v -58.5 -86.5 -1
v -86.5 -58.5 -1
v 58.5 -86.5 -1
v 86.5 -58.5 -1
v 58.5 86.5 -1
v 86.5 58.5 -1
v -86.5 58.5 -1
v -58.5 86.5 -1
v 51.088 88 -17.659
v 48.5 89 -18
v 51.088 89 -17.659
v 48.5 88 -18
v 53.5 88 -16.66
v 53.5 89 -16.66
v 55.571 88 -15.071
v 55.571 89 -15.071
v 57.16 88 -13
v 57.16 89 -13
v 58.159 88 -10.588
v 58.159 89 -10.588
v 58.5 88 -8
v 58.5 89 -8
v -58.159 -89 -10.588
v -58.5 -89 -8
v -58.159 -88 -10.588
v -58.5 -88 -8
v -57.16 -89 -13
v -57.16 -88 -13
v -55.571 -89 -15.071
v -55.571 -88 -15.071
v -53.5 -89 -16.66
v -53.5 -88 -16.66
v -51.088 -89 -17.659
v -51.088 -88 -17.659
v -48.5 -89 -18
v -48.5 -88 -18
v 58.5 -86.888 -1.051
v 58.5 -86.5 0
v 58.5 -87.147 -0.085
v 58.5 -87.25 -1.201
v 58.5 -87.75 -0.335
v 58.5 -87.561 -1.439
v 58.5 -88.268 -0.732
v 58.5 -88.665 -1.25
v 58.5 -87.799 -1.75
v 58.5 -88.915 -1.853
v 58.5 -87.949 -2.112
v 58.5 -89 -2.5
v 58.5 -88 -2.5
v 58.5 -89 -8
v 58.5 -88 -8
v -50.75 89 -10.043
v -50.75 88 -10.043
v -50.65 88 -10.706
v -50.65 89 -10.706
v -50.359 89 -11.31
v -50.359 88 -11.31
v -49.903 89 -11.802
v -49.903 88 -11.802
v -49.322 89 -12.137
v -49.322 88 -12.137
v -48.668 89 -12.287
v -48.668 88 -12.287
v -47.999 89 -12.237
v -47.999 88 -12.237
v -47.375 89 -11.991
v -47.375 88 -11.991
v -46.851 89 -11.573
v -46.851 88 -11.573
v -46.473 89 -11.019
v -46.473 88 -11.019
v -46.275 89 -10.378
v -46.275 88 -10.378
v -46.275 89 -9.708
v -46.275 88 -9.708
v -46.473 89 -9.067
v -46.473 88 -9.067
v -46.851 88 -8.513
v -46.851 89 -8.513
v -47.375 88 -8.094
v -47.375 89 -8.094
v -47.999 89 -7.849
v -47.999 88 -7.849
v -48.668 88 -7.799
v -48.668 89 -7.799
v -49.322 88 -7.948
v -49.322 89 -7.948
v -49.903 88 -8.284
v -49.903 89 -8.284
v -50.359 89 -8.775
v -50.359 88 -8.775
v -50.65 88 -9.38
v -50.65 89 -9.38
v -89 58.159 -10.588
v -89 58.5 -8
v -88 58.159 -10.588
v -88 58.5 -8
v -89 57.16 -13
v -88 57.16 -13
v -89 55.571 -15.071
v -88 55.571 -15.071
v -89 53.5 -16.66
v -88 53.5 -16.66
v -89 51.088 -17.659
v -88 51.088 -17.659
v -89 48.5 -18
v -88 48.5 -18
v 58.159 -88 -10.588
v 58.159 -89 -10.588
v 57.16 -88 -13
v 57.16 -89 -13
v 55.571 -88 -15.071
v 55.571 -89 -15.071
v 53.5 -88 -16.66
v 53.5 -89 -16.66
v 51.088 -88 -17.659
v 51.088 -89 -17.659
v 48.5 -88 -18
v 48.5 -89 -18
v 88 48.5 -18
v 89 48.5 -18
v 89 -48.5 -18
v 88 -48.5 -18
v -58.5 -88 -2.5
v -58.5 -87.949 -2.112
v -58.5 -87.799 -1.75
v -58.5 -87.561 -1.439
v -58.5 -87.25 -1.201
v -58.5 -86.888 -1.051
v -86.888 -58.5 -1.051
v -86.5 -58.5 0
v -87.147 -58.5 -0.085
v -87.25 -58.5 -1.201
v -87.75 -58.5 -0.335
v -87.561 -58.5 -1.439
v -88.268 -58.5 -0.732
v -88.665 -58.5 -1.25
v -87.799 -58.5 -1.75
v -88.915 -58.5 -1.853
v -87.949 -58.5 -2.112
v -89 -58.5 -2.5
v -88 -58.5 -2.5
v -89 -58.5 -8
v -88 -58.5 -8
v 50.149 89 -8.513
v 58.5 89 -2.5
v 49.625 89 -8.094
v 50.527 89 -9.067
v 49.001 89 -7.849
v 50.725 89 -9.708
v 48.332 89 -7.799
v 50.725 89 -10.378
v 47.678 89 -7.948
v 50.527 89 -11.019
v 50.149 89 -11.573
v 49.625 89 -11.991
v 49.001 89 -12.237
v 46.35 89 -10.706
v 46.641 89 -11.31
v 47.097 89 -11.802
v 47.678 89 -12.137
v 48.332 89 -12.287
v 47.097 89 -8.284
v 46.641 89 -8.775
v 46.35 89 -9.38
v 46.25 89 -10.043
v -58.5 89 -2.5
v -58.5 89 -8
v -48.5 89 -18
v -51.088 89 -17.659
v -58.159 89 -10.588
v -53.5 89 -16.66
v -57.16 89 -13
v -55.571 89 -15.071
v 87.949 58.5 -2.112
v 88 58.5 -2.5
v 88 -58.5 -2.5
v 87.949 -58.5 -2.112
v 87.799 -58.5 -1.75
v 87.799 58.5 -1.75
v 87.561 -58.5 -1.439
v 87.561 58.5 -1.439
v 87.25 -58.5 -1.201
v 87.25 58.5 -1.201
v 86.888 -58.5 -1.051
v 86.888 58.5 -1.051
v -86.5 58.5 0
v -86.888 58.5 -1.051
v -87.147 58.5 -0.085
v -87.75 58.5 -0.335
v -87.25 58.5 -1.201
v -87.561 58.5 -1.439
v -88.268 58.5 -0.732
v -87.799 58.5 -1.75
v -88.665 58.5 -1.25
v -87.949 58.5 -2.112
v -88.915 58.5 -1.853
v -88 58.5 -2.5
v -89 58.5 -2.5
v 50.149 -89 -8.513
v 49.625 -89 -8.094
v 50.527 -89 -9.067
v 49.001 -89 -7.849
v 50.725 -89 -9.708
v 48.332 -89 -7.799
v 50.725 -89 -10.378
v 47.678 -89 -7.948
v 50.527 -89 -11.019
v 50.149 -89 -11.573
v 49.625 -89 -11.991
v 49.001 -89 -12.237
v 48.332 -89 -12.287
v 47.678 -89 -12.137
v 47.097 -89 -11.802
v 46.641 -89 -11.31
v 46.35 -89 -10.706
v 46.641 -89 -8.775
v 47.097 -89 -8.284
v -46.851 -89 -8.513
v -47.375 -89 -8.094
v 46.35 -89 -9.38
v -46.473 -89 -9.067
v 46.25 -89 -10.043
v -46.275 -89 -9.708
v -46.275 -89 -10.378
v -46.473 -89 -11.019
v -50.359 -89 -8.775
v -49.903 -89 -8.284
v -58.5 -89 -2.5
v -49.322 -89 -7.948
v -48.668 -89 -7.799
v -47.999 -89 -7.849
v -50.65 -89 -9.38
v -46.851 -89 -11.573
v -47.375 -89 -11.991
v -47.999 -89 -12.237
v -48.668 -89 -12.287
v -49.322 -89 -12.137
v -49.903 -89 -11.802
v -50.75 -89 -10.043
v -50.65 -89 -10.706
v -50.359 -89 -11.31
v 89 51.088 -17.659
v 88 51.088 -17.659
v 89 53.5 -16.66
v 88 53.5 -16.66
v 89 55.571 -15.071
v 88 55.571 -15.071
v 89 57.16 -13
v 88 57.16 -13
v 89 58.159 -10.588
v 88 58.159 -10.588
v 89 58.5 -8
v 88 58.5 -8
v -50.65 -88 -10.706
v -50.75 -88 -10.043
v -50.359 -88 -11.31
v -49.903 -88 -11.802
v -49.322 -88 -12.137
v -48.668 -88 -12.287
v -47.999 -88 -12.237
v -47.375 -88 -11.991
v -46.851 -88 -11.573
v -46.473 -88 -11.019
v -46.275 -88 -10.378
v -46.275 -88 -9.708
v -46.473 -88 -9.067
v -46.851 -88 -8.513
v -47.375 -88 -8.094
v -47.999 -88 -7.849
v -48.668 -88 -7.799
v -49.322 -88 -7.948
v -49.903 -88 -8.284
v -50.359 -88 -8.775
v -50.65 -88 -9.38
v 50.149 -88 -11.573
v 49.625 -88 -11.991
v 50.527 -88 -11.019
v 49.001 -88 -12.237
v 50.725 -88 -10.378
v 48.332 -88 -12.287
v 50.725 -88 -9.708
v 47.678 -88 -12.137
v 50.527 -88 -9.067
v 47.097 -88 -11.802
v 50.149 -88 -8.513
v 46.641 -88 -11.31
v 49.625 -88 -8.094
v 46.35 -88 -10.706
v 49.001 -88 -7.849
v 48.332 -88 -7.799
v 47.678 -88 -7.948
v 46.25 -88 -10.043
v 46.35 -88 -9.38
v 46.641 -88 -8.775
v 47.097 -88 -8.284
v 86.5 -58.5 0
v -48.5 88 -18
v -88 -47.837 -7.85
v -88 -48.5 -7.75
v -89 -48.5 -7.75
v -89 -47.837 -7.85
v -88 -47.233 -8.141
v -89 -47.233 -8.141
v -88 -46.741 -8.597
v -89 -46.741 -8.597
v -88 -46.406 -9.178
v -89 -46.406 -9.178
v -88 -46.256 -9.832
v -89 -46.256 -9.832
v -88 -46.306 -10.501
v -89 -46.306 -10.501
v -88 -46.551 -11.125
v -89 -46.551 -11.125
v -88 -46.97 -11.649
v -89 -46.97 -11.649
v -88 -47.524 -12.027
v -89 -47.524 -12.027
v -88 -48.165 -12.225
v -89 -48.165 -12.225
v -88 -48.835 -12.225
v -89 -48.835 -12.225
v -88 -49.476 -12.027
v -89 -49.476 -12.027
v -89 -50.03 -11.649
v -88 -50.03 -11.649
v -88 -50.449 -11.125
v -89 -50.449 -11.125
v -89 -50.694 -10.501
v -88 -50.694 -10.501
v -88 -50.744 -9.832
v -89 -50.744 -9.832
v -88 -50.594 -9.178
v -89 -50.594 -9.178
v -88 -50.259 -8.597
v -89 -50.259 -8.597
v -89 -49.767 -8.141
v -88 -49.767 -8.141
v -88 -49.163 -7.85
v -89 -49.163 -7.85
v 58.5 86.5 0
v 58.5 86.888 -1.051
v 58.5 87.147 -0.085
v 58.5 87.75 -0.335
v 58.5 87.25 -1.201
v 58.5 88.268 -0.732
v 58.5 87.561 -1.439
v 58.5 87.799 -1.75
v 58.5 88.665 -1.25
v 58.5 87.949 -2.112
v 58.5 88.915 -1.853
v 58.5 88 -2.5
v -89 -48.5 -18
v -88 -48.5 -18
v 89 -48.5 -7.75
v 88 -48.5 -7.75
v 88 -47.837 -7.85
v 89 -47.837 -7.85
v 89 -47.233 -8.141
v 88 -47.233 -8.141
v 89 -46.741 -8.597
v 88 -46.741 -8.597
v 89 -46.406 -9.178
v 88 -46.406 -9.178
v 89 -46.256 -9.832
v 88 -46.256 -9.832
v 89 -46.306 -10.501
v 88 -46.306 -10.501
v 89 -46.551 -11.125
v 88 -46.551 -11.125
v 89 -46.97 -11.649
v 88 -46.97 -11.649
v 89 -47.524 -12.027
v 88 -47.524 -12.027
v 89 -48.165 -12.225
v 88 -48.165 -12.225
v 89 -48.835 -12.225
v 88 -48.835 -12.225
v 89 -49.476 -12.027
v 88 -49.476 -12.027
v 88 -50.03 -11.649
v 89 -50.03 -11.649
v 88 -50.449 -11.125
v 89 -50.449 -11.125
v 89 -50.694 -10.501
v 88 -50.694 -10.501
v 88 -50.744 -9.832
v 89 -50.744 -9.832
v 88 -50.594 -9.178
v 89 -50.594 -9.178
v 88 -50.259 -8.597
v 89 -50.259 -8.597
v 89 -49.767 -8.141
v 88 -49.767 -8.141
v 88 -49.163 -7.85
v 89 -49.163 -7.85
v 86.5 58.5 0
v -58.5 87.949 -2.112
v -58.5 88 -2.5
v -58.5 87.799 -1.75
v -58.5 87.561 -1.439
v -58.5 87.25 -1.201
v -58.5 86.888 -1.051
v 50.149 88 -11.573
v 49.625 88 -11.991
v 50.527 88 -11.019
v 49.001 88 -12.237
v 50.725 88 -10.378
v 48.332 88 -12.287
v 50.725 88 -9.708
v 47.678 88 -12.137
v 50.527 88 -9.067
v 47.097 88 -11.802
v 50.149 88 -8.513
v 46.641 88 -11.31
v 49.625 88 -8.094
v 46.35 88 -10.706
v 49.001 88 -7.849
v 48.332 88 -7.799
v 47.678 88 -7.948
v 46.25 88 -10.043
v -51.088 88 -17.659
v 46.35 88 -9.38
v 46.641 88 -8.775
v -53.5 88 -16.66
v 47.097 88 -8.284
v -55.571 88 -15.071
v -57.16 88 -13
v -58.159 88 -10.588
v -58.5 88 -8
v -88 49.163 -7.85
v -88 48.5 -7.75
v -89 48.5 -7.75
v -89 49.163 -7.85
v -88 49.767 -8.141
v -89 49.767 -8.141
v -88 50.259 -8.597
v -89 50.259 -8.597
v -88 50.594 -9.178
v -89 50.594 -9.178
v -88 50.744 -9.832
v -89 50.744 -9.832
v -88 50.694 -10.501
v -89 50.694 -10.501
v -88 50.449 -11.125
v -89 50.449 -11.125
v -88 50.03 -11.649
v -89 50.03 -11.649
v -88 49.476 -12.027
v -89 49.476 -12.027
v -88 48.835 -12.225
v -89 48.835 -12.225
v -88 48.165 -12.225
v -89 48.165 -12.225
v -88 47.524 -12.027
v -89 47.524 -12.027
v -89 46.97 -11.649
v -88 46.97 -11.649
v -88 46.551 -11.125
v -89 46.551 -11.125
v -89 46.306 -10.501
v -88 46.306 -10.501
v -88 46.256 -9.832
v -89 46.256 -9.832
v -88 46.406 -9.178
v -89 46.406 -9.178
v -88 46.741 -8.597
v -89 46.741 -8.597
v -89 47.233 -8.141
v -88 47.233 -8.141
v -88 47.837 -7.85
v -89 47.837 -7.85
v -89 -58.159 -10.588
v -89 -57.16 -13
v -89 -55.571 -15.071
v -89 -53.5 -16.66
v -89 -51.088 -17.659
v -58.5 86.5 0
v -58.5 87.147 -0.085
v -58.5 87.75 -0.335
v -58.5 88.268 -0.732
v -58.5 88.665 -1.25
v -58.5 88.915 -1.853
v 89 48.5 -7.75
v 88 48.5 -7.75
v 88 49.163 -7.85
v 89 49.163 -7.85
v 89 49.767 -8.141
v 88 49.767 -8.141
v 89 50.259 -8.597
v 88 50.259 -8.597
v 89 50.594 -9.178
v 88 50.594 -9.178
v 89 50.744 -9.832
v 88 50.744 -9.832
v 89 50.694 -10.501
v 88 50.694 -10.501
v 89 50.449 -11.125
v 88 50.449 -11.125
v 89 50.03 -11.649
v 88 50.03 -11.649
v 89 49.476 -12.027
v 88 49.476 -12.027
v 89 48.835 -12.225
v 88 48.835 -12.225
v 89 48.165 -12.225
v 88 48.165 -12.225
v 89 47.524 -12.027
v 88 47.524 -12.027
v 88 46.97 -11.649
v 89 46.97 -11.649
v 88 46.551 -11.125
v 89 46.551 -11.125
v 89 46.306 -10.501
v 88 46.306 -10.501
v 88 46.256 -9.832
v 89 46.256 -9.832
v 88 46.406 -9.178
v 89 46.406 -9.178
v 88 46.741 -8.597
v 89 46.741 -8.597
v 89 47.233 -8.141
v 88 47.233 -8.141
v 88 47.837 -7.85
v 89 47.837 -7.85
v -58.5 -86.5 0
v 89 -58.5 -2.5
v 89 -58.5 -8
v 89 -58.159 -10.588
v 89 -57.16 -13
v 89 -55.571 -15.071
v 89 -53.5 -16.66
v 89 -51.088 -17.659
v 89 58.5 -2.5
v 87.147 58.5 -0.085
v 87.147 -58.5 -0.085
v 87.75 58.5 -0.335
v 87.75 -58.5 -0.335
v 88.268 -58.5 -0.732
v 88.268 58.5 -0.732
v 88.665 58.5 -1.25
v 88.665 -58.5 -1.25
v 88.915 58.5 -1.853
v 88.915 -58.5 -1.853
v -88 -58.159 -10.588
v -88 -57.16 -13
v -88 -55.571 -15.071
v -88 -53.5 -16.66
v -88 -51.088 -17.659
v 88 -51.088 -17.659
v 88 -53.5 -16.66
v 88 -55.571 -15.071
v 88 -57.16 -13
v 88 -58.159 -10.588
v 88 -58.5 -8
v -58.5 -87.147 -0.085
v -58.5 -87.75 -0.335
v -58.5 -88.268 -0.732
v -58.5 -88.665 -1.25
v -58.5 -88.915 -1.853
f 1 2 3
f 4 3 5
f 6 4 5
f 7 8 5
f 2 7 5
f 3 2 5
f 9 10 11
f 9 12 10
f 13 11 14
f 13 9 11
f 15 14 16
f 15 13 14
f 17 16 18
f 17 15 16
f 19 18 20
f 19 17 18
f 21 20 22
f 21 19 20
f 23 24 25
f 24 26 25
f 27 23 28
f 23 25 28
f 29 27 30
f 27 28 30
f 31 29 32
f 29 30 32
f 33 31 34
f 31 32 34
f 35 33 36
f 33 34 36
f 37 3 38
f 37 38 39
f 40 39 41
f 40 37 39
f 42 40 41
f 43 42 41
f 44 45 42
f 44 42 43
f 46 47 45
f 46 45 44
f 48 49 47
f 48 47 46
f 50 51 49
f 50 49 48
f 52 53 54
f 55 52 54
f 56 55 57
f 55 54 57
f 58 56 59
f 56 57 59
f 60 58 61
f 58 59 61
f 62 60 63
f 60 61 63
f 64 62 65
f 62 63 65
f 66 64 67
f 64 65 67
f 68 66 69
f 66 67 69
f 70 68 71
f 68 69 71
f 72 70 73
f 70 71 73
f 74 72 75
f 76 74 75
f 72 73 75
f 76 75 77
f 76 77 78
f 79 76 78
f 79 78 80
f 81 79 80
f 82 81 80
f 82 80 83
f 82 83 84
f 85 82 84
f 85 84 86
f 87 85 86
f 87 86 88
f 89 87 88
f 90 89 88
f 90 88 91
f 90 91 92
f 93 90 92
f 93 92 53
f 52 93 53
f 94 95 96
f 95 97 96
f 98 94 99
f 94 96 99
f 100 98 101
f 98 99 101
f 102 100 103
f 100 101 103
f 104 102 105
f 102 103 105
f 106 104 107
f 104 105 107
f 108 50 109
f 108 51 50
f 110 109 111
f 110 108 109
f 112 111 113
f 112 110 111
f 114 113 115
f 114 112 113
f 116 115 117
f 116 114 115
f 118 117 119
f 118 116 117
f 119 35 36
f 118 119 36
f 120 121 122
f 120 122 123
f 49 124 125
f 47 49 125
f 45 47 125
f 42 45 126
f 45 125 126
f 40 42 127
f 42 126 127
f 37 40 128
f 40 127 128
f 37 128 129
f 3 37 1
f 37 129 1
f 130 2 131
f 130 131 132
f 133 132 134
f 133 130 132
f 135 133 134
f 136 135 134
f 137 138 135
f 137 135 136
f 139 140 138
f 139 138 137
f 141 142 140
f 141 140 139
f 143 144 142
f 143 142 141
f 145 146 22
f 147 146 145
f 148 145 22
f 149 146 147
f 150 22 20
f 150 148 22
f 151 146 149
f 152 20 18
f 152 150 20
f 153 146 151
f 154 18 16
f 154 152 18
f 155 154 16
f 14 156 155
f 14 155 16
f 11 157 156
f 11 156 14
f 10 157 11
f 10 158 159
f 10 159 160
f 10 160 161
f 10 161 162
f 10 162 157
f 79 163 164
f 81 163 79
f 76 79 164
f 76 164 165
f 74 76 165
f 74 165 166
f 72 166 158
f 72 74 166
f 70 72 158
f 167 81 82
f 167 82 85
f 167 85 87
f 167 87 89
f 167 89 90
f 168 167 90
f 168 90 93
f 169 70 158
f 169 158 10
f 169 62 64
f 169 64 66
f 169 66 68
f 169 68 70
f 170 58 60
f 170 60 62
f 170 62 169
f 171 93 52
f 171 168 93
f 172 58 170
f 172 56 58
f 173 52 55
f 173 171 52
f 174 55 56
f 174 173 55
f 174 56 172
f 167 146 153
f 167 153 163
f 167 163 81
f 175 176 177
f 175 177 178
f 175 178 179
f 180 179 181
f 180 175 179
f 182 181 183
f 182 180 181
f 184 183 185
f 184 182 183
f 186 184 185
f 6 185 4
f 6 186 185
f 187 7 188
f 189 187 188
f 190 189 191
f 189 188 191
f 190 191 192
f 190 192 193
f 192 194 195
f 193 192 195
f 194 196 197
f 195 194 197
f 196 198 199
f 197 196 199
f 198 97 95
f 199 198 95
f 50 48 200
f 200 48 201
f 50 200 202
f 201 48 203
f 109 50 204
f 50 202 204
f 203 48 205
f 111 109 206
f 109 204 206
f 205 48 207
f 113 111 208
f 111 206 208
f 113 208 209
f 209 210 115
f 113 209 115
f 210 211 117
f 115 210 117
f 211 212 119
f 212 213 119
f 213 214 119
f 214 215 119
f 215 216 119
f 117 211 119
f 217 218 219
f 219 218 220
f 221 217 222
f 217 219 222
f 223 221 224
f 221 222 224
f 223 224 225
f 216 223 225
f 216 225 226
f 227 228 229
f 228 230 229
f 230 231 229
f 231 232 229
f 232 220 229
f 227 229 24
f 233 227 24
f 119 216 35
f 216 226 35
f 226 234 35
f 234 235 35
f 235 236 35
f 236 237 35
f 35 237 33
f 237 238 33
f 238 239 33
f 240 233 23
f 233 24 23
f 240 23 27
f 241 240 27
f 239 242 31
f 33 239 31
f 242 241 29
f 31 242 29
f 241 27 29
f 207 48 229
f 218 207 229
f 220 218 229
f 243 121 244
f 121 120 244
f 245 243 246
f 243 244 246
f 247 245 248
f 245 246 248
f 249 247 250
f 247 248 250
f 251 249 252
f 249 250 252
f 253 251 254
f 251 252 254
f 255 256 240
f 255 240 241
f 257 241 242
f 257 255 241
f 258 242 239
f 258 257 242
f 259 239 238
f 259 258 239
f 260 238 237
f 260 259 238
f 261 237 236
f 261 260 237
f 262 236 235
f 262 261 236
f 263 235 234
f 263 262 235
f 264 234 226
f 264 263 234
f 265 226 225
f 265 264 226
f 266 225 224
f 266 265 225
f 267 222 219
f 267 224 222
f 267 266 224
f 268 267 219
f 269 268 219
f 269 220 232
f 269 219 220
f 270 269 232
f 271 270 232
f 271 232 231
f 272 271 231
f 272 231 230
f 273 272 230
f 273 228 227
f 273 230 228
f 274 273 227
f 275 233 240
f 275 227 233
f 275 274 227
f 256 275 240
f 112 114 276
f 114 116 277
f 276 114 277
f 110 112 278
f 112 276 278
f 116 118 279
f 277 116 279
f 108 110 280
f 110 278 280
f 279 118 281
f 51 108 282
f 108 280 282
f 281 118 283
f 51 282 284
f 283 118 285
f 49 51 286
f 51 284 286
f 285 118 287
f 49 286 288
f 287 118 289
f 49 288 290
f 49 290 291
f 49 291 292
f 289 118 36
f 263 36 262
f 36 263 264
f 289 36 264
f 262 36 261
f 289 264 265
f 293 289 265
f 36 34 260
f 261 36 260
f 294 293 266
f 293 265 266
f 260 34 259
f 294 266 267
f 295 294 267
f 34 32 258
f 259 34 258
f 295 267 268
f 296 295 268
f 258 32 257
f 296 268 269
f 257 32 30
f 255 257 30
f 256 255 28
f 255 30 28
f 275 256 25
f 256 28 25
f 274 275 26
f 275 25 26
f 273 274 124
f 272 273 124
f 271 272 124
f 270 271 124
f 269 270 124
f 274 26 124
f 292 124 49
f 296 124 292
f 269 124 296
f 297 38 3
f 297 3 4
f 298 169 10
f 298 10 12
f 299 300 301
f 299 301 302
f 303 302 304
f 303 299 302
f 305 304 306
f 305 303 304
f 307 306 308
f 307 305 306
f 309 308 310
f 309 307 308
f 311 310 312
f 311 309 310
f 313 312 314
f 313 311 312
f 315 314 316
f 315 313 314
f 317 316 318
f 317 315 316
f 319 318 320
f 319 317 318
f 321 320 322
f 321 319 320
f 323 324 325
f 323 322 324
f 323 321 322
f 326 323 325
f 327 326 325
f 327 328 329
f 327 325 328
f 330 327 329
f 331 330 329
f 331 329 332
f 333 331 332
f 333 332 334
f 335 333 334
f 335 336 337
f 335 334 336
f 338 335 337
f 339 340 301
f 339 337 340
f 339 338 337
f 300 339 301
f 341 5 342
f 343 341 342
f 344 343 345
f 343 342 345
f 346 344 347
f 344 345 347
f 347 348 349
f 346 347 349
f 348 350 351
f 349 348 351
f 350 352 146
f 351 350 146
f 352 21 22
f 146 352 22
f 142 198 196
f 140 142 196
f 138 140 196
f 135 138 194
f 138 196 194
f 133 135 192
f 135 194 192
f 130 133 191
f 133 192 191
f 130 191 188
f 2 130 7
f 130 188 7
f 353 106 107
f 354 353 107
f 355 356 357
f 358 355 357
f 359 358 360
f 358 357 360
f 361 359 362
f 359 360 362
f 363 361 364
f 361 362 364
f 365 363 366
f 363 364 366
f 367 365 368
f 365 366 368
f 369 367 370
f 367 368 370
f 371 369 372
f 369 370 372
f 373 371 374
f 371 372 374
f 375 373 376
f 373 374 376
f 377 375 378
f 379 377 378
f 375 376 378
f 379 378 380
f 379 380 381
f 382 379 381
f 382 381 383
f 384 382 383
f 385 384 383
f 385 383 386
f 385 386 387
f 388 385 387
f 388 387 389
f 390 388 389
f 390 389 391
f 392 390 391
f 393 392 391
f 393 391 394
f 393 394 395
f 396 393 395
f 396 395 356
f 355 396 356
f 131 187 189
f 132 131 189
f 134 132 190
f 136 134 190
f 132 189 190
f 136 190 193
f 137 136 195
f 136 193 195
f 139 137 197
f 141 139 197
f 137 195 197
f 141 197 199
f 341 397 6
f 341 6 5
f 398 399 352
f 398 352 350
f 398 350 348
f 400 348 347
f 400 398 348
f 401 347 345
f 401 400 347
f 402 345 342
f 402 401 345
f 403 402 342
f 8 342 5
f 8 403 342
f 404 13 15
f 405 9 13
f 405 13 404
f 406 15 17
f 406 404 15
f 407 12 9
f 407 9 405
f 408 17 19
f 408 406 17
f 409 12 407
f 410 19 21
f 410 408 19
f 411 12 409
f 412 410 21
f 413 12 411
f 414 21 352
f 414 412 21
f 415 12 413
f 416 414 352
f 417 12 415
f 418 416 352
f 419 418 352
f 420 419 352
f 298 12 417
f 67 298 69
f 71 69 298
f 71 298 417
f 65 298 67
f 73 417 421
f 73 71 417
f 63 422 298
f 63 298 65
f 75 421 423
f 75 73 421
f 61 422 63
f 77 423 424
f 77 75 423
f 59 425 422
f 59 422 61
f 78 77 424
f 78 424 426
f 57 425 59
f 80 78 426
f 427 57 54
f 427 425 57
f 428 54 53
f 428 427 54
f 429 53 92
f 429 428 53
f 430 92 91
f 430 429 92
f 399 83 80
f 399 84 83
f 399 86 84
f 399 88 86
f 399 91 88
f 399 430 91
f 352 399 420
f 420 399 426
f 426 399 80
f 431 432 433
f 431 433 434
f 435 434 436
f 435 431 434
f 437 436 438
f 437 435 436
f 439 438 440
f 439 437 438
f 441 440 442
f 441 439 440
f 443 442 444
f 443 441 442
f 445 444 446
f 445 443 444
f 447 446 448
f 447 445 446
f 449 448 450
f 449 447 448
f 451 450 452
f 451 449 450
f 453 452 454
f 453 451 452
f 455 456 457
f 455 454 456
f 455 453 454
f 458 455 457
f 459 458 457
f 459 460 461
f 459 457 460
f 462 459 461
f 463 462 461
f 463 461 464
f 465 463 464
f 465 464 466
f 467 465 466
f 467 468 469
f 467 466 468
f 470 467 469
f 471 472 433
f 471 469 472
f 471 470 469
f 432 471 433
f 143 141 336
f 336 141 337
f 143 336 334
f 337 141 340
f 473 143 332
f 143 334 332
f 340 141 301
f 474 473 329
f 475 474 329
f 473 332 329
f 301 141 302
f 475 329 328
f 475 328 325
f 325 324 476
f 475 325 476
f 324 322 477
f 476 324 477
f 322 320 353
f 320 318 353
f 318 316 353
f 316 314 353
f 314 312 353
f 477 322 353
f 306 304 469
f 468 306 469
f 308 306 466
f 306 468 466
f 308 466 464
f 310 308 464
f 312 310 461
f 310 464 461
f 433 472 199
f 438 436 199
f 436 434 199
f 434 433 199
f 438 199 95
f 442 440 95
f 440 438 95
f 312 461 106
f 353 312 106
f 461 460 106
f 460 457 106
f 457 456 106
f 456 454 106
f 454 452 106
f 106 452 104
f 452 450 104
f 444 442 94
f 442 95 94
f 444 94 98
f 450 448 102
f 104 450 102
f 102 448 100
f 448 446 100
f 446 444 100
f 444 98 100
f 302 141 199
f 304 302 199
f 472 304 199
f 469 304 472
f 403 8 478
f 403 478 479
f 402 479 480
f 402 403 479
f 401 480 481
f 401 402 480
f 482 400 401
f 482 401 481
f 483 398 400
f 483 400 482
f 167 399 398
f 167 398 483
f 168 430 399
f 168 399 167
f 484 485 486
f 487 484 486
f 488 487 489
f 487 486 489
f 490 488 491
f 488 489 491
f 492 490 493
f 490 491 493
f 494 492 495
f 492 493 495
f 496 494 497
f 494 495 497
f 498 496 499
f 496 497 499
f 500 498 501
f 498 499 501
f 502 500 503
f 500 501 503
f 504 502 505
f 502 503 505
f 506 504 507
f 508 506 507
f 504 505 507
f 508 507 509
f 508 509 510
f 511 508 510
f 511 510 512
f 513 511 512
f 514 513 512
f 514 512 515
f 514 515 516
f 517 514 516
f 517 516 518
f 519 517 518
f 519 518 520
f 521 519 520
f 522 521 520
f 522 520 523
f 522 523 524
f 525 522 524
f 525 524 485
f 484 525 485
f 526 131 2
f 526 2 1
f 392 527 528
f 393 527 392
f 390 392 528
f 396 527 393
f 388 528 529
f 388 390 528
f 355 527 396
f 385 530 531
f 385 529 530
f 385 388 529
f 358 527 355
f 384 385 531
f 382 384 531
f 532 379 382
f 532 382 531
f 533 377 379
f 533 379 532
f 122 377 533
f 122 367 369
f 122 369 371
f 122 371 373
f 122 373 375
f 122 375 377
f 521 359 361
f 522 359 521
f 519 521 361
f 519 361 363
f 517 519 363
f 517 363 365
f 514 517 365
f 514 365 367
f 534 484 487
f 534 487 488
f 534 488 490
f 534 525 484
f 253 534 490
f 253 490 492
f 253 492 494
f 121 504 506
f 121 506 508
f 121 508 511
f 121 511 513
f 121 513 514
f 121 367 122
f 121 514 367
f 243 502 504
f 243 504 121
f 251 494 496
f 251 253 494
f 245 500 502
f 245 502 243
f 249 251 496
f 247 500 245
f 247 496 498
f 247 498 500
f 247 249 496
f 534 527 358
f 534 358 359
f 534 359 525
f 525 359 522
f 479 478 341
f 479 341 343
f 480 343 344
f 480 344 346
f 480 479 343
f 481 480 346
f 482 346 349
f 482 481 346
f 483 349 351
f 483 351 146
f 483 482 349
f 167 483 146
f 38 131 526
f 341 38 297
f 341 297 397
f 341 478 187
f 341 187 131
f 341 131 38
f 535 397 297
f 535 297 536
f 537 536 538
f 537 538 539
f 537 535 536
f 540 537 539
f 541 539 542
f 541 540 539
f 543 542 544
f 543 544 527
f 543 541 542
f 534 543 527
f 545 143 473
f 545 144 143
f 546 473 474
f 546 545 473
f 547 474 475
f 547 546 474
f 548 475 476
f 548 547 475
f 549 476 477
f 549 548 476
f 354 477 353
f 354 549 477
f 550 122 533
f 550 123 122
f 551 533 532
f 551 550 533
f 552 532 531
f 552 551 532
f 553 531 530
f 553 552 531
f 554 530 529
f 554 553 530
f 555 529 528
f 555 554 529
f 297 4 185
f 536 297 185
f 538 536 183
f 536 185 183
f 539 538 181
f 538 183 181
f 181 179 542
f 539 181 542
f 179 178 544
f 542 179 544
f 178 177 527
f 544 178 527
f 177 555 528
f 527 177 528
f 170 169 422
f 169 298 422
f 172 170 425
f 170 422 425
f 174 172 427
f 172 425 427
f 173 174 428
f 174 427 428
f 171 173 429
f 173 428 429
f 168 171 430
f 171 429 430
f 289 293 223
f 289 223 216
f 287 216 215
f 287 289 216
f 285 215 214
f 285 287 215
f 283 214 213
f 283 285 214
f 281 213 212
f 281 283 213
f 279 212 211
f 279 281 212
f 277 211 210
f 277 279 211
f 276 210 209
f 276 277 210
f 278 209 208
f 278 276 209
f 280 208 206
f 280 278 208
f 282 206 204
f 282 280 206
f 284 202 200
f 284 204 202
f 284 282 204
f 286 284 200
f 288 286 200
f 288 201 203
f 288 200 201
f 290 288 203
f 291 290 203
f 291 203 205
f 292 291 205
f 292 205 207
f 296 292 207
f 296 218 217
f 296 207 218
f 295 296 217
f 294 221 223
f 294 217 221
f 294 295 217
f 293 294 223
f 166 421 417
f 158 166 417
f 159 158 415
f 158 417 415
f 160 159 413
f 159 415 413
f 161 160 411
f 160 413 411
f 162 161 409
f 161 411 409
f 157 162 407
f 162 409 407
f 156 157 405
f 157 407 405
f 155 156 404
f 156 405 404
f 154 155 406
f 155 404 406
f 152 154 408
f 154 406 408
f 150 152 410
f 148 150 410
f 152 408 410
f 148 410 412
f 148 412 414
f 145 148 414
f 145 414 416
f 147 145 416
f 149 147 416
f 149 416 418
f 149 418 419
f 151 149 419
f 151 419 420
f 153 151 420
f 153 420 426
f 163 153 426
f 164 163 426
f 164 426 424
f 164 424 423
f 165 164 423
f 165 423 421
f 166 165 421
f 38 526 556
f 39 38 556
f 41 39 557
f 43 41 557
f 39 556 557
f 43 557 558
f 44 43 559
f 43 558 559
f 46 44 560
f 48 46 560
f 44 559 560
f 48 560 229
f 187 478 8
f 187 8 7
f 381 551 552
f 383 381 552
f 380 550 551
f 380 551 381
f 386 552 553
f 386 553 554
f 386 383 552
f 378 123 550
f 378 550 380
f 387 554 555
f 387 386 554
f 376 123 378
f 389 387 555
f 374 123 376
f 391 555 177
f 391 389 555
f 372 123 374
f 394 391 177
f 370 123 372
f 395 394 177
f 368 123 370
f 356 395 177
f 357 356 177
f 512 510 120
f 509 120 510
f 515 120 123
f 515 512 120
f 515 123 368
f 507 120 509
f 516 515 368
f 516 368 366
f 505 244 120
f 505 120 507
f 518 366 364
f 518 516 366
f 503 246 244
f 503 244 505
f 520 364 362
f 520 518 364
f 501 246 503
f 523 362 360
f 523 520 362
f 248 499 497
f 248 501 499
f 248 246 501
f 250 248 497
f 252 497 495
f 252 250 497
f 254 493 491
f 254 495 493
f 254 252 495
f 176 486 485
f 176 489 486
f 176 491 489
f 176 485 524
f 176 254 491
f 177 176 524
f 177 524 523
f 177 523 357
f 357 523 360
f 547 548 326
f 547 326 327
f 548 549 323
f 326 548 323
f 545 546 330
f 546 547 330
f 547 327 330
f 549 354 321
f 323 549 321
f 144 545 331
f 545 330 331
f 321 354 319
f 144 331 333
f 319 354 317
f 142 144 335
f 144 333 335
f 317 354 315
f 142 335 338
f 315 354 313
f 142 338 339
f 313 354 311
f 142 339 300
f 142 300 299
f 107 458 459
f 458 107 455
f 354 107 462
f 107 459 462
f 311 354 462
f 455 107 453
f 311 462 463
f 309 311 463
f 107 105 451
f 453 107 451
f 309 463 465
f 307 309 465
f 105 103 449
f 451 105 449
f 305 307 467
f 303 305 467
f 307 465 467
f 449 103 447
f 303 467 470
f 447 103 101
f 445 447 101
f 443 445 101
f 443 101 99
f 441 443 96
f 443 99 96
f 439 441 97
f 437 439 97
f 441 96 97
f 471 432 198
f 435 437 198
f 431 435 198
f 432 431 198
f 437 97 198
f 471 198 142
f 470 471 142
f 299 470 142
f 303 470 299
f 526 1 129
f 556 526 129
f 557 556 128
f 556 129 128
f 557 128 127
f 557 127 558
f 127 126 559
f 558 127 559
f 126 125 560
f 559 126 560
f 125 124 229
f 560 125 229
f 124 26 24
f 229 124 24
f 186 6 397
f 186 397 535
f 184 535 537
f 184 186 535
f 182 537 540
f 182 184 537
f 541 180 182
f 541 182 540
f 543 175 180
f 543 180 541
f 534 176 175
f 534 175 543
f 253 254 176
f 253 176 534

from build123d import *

# Parameters (mm, degrees)
MAIN_PLATE_DEPTH                       = 1
HORI_EDGE_DEPTH                        = 117
HORI_EDGE_FILLETS_R                    = 10
M4_CLEARANCE_HOLE1_D                   = 4.5
M4_CLEARANCE_HOLE1_DEPTH               = 178
VERT_EDGE_DEPTH                        = 117
VERT_EDGE_FILLETS_R                    = 10
M4_CLEARANCE_HOLE2_D                   = 4.5
M4_CLEARANCE_HOLE2_DEPTH               = 178
HORI_EDGE_FILLETS_OF_OTHER_HORI_EDGE_R = 10
VERT_EDGE_FILLETS_OF_OTHER_VERT_EDGE_R = 10


# Sheet-metal steps are written as plain solids
with BuildPart() as part:
    # Sketch1 → Main Plate (new body)
    with BuildSketch(Plane.XY):
        Polygon((-86.5, -58.5), (-58.5, -86.5), (58.5, -86.5), (86.5, -58.5), (86.5, 58.5), (58.5, 86.5), (-58.5, 86.5), (-86.5, 58.5), align=None)
    extrude(amount=-MAIN_PLATE_DEPTH)

    # Hori Edge section (across the edge) → Hori Edge (add)
    with BuildSketch(Plane(origin=(-58.5, 88, -1), x_dir=(0, -1, 0), z_dir=(1, 0, 0))):
        with BuildLine():
            Line((-1, 1.5), (-1, 17))
            Line((-1, 17), (0, 17))
            Line((0, 17), (0, 1.5))
            ThreePointArc((0, 1.5), (0.439339828, 0.439339828), (1.5, 0))
            Line((1.5, 0), (1.5, -1))
            ThreePointArc((1.5, -1), (-0.267766953, -0.267766953), (-1, 1.5))
        make_face()
    hori_edge = extrude(amount=HORI_EDGE_DEPTH)

    # Hori Edge Fillets
    hori_edge_fillets_edges = [part.edges().sort_by_distance(p)[0] for p in [
        (-58.5, 88.5, -18),
        (58.5, 88.5, -18),
    ]]
    fillet(hori_edge_fillets_edges, radius=HORI_EDGE_FILLETS_R)

    # M4 Clearance Hole1
    with Locations(Plane(origin=(0, 89, 0), x_dir=(1, 0, 0), z_dir=(0, 1, 0))):
        with Locations((-48.5, 10.042929808), (48.5, 10.042929808)):
            m4_clearance_hole1 = Hole(M4_CLEARANCE_HOLE1_D / 2, depth=M4_CLEARANCE_HOLE1_DEPTH)

    # Vert Edge section (across the edge) → Vert Edge (add)
    with BuildSketch(Plane(origin=(88, 58.5, -1), x_dir=(-1, 0, 0), z_dir=(0, -1, 0))):
        with BuildLine():
            Line((-1, 1.5), (-1, 17))
            Line((-1, 17), (0, 17))
            Line((0, 17), (0, 1.5))
            ThreePointArc((0, 1.5), (0.439339828, 0.439339828), (1.5, 0))
            Line((1.5, 0), (1.5, -1))
            ThreePointArc((1.5, -1), (-0.267766953, -0.267766953), (-1, 1.5))
        make_face()
    vert_edge = extrude(amount=VERT_EDGE_DEPTH)

    # Vert Edge Fillets
    vert_edge_fillets_edges = [part.edges().sort_by_distance(p)[0] for p in [
        (88.5, 58.5, -18),
        (88.5, -58.5, -18),
    ]]
    fillet(vert_edge_fillets_edges, radius=VERT_EDGE_FILLETS_R)

    # M4 Clearance Hole2
    with Locations(Plane(origin=(89, 0, 0), x_dir=(0, 0, -1), z_dir=(1, 0, 0))):
        with Locations((10, 48.5), (10, -48.5)):
            m4_clearance_hole2 = Hole(M4_CLEARANCE_HOLE2_D / 2, depth=M4_CLEARANCE_HOLE2_DEPTH)

    # Other Hori Edge: Hori Edge, M4 Clearance Hole1 across plane
    add(hori_edge.mirror(Plane.ZX))
    add(m4_clearance_hole1.mirror(Plane.ZX), mode=Mode.SUBTRACT)

    # Hori Edge Fillets of Other Hori Edge
    hori_edge_fillets_of_other_hori_edge_edges = [part.edges().sort_by_distance(p)[0] for p in [
        (-58.5, -88.5, -18),
        (58.5, -88.5, -18),
    ]]
    fillet(hori_edge_fillets_of_other_hori_edge_edges, radius=HORI_EDGE_FILLETS_OF_OTHER_HORI_EDGE_R)

    # Other Vert Edge: Vert Edge, M4 Clearance Hole2 across plane
    add(vert_edge.mirror(Plane(origin=(0, 0, 0), x_dir=(0, 0, 1), z_dir=(1, 0, 0))))
    add(m4_clearance_hole2.mirror(Plane(origin=(0, 0, 0), x_dir=(0, 0, 1), z_dir=(1, 0, 0))), mode=Mode.SUBTRACT)

    # Vert Edge Fillets of Other Vert Edge
    vert_edge_fillets_of_other_vert_edge_edges = [part.edges().sort_by_distance(p)[0] for p in [
        (-88.5, 58.5, -18),
        (-88.5, -58.5, -18),
    ]]
    fillet(vert_edge_fillets_of_other_vert_edge_edges, radius=VERT_EDGE_FILLETS_OF_OTHER_VERT_EDGE_R)


solid = part.part
